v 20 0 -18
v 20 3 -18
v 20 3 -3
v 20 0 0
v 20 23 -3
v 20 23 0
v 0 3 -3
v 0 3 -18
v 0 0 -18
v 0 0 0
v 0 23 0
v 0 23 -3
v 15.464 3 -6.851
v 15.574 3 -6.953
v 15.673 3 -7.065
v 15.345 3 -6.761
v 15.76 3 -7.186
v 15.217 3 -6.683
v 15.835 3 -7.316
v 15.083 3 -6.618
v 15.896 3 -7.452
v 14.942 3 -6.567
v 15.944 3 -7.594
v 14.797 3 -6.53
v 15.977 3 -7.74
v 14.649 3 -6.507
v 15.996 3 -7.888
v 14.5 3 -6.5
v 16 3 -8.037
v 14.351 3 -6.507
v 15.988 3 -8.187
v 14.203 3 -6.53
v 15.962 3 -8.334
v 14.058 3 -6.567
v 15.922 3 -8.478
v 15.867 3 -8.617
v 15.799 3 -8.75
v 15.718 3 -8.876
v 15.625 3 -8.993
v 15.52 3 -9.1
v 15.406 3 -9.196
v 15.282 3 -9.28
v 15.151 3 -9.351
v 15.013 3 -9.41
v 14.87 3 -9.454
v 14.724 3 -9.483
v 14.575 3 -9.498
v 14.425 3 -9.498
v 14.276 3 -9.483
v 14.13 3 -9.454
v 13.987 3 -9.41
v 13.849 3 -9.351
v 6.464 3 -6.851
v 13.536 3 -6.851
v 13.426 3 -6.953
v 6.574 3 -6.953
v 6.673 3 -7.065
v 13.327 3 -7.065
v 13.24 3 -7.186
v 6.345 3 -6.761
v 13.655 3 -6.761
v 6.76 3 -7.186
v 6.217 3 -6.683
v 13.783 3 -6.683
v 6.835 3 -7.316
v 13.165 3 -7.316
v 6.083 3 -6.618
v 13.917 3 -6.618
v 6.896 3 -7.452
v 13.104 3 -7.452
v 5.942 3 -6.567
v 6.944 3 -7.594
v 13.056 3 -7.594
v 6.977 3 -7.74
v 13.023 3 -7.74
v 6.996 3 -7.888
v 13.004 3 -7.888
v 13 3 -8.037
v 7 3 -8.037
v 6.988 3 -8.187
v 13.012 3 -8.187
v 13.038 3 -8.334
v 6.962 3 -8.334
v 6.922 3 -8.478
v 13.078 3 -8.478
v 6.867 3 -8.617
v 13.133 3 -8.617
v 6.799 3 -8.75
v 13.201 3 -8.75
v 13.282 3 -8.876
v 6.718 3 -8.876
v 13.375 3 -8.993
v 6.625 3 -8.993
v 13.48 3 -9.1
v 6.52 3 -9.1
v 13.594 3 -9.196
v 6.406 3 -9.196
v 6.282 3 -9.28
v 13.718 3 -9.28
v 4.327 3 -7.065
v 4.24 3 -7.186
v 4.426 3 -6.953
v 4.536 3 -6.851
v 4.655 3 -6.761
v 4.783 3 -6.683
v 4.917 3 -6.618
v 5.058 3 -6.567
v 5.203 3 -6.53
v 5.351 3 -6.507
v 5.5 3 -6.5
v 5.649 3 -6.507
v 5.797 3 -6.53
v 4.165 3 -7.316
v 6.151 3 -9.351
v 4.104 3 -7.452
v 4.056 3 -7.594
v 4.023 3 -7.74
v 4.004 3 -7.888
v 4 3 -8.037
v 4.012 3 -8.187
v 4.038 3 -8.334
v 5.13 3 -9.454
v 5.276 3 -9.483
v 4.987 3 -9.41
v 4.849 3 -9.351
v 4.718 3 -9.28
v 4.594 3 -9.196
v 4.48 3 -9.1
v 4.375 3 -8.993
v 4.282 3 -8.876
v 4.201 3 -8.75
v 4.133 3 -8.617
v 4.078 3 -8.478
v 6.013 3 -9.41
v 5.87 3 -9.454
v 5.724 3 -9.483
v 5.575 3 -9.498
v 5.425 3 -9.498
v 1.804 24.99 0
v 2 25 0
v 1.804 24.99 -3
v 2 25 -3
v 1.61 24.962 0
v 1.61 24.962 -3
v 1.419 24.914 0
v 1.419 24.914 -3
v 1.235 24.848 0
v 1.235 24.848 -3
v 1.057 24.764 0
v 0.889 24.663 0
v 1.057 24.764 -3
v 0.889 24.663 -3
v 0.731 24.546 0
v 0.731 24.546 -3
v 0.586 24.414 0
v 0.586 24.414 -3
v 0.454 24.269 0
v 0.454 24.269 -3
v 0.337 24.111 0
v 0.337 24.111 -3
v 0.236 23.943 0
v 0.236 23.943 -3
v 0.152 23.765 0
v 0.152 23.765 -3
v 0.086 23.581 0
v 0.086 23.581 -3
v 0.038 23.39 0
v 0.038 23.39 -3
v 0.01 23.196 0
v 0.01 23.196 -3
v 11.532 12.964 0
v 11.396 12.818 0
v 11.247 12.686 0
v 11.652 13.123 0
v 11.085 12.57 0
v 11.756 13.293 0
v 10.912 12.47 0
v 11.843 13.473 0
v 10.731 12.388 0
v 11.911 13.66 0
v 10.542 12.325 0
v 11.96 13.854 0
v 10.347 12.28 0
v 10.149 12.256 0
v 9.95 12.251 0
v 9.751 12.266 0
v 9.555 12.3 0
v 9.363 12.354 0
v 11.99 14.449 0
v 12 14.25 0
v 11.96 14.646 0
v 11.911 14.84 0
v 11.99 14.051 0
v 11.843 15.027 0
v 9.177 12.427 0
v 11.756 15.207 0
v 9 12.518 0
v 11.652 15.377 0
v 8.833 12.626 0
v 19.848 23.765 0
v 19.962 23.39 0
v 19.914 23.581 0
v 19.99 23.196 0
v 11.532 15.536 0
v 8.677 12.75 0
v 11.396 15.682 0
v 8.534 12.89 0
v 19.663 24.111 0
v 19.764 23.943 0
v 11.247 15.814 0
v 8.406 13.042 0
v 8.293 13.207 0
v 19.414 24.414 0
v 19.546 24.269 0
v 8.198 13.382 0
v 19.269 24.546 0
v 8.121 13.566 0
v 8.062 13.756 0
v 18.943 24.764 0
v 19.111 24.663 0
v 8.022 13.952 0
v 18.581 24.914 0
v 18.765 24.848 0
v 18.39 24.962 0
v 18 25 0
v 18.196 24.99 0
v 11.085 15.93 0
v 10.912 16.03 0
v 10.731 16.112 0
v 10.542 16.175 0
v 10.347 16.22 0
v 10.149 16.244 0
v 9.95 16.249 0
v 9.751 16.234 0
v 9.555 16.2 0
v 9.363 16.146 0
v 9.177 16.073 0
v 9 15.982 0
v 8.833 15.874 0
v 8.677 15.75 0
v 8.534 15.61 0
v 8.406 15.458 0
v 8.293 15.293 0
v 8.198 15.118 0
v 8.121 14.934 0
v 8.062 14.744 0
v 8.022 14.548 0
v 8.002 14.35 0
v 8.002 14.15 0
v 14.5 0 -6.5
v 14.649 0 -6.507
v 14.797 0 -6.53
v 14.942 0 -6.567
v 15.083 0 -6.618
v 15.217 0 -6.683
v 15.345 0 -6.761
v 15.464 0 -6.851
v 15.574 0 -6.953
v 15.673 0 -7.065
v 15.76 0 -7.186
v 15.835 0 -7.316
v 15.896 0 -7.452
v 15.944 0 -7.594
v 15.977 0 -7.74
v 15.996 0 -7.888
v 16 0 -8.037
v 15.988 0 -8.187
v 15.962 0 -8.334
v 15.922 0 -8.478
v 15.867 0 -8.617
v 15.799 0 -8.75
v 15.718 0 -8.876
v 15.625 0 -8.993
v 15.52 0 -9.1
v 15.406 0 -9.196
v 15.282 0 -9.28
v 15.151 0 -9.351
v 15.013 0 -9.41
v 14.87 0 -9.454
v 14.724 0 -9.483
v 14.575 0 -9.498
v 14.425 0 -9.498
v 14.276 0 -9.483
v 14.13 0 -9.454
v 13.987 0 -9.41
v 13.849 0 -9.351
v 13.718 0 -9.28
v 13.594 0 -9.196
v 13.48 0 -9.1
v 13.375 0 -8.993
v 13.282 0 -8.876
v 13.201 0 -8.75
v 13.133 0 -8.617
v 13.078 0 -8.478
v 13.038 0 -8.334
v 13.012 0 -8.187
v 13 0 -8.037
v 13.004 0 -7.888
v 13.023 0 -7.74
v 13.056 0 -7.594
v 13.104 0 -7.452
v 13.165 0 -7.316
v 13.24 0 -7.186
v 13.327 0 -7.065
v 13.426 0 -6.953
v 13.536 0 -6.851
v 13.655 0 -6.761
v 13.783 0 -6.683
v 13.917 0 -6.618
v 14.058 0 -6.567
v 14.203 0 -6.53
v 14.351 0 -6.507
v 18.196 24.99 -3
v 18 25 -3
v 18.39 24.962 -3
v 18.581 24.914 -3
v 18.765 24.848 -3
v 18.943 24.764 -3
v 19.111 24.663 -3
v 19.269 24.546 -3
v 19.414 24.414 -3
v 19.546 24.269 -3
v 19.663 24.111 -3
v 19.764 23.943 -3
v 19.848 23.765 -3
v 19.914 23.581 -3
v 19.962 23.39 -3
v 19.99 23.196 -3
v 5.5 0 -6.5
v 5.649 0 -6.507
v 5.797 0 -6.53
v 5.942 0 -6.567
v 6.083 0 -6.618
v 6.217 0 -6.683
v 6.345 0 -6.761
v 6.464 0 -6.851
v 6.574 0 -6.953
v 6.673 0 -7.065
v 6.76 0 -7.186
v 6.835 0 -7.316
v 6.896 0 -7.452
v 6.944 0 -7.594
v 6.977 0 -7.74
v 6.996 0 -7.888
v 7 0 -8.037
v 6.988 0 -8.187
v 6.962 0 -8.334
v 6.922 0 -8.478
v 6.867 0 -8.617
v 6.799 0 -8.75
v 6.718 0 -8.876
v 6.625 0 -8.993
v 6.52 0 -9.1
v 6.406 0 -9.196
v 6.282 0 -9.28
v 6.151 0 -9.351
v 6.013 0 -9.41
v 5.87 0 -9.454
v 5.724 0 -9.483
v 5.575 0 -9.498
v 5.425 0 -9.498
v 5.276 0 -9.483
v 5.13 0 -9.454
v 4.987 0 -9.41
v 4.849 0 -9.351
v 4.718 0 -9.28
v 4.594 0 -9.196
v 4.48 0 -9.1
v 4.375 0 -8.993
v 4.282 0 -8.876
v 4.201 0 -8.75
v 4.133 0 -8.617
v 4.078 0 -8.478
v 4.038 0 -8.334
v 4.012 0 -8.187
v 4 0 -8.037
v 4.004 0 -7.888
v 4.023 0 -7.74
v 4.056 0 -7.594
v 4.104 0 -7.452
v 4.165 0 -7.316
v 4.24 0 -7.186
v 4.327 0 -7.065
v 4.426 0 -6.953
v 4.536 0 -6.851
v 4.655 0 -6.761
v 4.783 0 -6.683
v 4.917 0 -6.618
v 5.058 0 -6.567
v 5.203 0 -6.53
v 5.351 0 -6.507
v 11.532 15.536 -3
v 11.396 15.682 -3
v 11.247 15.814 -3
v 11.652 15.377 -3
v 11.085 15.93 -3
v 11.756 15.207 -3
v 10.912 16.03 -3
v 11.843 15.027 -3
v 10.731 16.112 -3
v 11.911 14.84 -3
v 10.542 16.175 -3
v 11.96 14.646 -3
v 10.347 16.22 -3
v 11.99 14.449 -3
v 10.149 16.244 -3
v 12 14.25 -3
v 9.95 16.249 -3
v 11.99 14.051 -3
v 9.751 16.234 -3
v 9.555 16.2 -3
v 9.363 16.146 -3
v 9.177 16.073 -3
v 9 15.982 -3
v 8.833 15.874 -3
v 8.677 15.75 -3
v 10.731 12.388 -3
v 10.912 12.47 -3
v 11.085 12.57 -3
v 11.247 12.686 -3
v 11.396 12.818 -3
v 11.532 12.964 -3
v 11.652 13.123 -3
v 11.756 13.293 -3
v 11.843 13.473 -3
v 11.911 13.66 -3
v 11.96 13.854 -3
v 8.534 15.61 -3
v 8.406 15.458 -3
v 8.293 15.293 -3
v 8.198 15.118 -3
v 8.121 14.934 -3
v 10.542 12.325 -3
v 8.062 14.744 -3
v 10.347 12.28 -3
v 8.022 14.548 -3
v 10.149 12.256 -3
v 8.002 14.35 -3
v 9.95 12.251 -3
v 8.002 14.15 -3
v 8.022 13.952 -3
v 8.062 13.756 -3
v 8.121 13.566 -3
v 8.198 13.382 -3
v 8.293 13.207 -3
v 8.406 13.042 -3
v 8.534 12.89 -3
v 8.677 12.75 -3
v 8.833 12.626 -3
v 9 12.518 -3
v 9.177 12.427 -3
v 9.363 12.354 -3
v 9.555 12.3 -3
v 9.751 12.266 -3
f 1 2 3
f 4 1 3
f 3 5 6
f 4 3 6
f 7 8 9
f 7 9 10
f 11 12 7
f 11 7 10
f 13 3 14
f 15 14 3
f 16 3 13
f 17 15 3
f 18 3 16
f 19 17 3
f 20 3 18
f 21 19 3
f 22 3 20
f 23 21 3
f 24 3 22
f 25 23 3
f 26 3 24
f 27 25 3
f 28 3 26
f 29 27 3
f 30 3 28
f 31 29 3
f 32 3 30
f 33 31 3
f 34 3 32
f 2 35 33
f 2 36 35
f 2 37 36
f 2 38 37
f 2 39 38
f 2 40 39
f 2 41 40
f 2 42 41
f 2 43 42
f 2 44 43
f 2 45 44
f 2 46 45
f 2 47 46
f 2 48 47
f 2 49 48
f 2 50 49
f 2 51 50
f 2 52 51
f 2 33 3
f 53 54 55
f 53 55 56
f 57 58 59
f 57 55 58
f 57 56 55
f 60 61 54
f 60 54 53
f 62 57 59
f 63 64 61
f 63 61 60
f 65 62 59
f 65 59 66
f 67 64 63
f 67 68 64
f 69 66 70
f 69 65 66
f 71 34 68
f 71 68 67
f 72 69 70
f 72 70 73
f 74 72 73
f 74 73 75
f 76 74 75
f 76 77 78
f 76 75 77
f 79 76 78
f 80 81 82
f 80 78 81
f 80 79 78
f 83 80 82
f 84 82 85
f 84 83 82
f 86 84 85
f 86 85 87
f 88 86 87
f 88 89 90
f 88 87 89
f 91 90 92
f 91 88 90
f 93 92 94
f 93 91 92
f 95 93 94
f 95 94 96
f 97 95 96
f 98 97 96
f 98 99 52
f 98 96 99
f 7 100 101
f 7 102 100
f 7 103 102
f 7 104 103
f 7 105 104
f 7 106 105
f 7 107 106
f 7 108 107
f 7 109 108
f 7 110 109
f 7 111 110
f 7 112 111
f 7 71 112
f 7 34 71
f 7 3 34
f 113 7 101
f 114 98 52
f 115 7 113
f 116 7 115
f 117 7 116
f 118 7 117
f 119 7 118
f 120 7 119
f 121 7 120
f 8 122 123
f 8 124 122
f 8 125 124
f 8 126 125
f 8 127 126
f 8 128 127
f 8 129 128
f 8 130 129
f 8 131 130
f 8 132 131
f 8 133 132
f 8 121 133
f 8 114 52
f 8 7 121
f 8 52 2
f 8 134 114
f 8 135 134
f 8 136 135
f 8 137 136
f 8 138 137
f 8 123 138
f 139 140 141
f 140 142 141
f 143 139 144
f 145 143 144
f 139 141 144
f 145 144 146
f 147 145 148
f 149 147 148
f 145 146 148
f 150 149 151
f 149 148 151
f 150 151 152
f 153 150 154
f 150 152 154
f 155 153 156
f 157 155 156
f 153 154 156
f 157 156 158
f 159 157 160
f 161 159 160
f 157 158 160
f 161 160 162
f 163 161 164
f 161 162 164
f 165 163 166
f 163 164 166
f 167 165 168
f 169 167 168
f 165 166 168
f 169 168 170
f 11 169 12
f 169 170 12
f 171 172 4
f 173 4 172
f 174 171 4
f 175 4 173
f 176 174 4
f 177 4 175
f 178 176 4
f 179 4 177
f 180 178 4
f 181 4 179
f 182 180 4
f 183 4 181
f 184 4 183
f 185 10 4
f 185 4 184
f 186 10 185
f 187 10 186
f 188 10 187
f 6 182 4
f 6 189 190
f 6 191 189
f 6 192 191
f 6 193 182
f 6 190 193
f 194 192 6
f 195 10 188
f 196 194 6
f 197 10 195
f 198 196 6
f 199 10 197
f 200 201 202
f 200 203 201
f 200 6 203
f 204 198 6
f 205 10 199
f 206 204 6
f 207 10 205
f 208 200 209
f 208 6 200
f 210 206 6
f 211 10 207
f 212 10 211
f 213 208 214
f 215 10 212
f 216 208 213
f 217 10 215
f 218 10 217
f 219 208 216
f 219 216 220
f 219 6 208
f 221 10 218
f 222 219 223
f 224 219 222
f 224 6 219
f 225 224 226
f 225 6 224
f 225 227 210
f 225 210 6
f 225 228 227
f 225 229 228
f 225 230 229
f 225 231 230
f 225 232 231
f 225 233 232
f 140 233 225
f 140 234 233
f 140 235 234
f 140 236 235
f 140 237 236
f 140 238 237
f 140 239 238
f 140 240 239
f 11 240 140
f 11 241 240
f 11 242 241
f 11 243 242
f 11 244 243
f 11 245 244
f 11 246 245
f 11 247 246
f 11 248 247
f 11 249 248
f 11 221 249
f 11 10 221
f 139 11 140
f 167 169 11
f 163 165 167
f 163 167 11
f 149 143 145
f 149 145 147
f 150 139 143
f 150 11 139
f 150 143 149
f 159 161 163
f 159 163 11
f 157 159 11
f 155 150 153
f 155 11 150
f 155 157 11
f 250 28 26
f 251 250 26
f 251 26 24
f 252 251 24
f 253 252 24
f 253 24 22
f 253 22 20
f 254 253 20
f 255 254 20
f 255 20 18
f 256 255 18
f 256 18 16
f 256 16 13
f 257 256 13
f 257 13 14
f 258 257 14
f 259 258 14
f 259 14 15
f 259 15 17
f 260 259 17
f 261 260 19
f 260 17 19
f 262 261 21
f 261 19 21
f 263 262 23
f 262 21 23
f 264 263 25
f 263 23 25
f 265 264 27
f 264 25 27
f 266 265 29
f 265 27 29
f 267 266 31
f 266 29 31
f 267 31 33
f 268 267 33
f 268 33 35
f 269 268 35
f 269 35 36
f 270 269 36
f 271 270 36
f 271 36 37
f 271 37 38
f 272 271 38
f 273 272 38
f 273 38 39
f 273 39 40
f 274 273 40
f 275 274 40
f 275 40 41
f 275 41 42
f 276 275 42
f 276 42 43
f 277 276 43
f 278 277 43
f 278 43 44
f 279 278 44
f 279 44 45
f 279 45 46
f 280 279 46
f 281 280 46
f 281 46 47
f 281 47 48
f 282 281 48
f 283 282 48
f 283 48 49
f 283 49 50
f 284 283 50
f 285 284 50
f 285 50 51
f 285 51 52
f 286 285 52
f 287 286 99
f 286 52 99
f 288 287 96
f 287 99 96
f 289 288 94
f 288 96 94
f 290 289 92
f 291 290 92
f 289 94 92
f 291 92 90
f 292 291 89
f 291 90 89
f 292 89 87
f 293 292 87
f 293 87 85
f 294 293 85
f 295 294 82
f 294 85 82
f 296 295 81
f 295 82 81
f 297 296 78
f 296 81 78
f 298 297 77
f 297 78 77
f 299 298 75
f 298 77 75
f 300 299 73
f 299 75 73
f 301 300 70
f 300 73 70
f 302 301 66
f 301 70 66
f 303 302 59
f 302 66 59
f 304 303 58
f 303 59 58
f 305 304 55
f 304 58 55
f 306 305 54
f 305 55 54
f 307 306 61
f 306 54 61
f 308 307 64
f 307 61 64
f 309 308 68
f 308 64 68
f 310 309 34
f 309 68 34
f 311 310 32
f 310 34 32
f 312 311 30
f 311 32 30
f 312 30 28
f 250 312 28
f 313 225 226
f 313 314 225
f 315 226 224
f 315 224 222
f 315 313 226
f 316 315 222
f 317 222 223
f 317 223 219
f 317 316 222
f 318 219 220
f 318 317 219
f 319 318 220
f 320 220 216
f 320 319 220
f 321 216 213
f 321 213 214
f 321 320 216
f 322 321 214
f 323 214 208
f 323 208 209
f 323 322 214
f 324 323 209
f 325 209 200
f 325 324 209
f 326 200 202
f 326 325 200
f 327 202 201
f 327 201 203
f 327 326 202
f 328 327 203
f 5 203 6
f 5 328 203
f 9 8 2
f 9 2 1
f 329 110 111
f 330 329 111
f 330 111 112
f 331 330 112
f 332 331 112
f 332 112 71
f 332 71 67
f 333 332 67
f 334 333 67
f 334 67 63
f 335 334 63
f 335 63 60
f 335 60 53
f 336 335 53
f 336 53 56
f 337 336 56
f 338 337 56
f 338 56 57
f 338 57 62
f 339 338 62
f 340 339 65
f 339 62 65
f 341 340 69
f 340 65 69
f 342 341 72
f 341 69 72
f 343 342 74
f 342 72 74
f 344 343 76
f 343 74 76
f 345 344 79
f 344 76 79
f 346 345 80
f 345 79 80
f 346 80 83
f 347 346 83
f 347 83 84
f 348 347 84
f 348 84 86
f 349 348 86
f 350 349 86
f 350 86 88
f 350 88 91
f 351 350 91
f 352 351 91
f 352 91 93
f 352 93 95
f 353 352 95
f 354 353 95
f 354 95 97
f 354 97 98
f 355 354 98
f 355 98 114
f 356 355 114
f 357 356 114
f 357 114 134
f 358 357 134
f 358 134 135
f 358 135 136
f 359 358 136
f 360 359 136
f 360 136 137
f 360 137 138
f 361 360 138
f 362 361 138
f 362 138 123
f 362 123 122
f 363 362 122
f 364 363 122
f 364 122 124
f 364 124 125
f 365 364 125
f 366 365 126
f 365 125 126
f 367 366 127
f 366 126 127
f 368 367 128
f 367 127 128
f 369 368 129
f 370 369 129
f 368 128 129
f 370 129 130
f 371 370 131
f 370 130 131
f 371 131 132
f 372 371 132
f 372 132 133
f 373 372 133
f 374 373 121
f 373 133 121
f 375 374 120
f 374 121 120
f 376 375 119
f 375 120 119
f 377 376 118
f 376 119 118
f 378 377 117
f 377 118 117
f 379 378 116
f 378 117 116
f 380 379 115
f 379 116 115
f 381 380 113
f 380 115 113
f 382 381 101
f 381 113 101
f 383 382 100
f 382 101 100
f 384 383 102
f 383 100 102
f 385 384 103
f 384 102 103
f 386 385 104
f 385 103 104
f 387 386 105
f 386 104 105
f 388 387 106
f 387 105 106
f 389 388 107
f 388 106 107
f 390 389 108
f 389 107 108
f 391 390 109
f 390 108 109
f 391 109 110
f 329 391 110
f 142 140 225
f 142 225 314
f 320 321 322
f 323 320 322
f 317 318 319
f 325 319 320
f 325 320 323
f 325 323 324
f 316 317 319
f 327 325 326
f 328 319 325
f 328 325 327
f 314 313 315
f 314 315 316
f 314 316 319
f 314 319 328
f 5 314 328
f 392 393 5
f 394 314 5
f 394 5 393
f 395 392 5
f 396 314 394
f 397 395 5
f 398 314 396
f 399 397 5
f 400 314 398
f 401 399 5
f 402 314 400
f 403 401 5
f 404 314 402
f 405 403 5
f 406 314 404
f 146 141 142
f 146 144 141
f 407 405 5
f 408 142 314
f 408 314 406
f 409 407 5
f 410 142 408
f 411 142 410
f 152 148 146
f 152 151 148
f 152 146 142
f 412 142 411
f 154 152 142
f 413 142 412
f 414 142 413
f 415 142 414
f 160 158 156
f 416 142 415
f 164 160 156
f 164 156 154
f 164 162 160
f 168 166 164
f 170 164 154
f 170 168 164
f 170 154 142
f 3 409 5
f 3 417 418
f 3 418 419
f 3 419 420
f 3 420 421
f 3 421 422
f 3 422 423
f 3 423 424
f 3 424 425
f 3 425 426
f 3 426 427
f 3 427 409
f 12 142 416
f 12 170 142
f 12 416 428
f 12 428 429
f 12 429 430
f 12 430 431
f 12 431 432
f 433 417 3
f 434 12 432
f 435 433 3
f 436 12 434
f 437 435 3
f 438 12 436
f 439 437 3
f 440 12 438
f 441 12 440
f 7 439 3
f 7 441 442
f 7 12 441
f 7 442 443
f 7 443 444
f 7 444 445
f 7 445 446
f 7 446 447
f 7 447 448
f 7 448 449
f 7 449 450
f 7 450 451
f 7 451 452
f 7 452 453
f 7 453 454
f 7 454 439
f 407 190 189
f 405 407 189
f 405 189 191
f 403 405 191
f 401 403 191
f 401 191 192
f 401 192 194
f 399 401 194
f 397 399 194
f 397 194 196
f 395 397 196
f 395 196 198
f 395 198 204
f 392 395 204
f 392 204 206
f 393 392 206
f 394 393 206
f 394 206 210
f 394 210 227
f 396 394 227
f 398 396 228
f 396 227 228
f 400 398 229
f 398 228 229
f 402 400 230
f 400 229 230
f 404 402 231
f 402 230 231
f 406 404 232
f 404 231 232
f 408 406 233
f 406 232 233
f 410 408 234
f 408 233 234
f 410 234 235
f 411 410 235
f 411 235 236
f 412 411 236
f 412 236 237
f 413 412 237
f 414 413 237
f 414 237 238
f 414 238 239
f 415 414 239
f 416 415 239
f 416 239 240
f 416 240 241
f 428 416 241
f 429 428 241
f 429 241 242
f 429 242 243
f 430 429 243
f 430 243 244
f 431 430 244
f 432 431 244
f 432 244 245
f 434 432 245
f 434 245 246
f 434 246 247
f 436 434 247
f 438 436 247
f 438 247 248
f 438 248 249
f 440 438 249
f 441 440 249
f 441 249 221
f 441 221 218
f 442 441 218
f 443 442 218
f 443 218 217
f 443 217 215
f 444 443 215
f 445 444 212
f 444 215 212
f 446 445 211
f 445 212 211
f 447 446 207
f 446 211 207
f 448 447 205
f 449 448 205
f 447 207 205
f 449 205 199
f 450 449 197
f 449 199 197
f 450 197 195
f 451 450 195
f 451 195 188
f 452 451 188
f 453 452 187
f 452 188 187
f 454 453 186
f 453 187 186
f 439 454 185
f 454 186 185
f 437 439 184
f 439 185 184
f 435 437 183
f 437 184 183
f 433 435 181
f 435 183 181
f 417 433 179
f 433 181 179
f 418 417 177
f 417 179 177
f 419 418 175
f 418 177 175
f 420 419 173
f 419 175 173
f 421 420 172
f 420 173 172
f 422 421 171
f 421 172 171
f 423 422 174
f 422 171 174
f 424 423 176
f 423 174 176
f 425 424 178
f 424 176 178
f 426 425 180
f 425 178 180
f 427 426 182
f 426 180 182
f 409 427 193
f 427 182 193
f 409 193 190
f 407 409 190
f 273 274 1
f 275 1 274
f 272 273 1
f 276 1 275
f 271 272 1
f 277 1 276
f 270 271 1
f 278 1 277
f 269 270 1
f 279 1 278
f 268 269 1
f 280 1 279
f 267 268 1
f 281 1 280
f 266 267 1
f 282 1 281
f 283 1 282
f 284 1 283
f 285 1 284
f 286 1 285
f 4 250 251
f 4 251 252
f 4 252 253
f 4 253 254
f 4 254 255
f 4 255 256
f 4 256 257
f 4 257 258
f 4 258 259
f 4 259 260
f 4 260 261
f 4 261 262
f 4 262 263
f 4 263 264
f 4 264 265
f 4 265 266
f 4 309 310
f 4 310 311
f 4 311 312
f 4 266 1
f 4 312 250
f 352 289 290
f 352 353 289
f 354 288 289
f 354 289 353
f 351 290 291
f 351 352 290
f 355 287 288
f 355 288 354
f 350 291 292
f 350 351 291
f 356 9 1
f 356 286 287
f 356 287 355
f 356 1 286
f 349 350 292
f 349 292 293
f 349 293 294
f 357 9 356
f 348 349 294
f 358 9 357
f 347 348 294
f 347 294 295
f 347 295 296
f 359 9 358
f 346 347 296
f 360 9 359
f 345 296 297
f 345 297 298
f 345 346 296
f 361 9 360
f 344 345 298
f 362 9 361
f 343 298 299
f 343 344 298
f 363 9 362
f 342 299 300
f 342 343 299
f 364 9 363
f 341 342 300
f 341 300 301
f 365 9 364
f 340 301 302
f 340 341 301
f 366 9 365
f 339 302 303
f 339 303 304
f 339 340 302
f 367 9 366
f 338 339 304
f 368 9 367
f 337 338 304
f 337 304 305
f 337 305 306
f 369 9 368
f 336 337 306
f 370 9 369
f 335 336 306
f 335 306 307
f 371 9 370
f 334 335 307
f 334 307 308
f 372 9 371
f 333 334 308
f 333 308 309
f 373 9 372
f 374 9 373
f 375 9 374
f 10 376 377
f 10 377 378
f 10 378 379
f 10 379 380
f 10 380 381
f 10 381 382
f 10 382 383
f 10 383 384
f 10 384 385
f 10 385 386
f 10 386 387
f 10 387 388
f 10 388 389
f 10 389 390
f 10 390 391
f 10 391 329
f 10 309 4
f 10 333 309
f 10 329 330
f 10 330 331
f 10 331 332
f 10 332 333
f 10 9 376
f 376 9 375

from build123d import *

# Parameters (mm, degrees)
EXTRUDE_1_DEPTH     = 20
SKETCH_2_R          = 1.5
CUT_EXTRUDE_1_DEPTH = 35.756294394
FILLET_1_R          = 2
SKETCH_3_R          = 2
CUT_EXTRUDE_2_DEPTH = 37.728735344


with BuildPart() as part:
    # 草图1 → 凸台-拉伸1 (new body)
    with BuildSketch(Plane(origin=(0, 0, 0), x_dir=(0, 0, -1), z_dir=(1, 0, 0))):
        Polygon((0, 0), (0, 25), (3, 25), (3, 3), (18, 3), (18, 0), align=None)
    extrude(amount=EXTRUDE_1_DEPTH)

    # 草图2 → 切除-拉伸1 (cut, through all)
    with BuildSketch(Plane(origin=(0, 3, 0), x_dir=(1, 0, 0), z_dir=(0, 1, 0))):
        with Locations(Location((5.5, 8, 0), (0, 0, 270))):
            Circle(SKETCH_2_R)
        with Locations(Location((14.5, 8, 0), (0, 0, 270))):
            Circle(SKETCH_2_R)
    extrude(amount=-CUT_EXTRUDE_1_DEPTH, mode=Mode.SUBTRACT)

    # 圆角1
    fillet_1_edges = [part.edges().sort_by_distance(p)[0] for p in [
        (20, 25, -1.5),
        (0, 25, -1.5),
    ]]
    fillet(fillet_1_edges, radius=FILLET_1_R)

    # 草图3 → 切除-拉伸2 (cut, through all)
    with BuildSketch(Plane.XY):
        with Locations((10, 14.25)):
            Circle(SKETCH_3_R)
    extrude(amount=-CUT_EXTRUDE_2_DEPTH, mode=Mode.SUBTRACT)


solid = part.part
